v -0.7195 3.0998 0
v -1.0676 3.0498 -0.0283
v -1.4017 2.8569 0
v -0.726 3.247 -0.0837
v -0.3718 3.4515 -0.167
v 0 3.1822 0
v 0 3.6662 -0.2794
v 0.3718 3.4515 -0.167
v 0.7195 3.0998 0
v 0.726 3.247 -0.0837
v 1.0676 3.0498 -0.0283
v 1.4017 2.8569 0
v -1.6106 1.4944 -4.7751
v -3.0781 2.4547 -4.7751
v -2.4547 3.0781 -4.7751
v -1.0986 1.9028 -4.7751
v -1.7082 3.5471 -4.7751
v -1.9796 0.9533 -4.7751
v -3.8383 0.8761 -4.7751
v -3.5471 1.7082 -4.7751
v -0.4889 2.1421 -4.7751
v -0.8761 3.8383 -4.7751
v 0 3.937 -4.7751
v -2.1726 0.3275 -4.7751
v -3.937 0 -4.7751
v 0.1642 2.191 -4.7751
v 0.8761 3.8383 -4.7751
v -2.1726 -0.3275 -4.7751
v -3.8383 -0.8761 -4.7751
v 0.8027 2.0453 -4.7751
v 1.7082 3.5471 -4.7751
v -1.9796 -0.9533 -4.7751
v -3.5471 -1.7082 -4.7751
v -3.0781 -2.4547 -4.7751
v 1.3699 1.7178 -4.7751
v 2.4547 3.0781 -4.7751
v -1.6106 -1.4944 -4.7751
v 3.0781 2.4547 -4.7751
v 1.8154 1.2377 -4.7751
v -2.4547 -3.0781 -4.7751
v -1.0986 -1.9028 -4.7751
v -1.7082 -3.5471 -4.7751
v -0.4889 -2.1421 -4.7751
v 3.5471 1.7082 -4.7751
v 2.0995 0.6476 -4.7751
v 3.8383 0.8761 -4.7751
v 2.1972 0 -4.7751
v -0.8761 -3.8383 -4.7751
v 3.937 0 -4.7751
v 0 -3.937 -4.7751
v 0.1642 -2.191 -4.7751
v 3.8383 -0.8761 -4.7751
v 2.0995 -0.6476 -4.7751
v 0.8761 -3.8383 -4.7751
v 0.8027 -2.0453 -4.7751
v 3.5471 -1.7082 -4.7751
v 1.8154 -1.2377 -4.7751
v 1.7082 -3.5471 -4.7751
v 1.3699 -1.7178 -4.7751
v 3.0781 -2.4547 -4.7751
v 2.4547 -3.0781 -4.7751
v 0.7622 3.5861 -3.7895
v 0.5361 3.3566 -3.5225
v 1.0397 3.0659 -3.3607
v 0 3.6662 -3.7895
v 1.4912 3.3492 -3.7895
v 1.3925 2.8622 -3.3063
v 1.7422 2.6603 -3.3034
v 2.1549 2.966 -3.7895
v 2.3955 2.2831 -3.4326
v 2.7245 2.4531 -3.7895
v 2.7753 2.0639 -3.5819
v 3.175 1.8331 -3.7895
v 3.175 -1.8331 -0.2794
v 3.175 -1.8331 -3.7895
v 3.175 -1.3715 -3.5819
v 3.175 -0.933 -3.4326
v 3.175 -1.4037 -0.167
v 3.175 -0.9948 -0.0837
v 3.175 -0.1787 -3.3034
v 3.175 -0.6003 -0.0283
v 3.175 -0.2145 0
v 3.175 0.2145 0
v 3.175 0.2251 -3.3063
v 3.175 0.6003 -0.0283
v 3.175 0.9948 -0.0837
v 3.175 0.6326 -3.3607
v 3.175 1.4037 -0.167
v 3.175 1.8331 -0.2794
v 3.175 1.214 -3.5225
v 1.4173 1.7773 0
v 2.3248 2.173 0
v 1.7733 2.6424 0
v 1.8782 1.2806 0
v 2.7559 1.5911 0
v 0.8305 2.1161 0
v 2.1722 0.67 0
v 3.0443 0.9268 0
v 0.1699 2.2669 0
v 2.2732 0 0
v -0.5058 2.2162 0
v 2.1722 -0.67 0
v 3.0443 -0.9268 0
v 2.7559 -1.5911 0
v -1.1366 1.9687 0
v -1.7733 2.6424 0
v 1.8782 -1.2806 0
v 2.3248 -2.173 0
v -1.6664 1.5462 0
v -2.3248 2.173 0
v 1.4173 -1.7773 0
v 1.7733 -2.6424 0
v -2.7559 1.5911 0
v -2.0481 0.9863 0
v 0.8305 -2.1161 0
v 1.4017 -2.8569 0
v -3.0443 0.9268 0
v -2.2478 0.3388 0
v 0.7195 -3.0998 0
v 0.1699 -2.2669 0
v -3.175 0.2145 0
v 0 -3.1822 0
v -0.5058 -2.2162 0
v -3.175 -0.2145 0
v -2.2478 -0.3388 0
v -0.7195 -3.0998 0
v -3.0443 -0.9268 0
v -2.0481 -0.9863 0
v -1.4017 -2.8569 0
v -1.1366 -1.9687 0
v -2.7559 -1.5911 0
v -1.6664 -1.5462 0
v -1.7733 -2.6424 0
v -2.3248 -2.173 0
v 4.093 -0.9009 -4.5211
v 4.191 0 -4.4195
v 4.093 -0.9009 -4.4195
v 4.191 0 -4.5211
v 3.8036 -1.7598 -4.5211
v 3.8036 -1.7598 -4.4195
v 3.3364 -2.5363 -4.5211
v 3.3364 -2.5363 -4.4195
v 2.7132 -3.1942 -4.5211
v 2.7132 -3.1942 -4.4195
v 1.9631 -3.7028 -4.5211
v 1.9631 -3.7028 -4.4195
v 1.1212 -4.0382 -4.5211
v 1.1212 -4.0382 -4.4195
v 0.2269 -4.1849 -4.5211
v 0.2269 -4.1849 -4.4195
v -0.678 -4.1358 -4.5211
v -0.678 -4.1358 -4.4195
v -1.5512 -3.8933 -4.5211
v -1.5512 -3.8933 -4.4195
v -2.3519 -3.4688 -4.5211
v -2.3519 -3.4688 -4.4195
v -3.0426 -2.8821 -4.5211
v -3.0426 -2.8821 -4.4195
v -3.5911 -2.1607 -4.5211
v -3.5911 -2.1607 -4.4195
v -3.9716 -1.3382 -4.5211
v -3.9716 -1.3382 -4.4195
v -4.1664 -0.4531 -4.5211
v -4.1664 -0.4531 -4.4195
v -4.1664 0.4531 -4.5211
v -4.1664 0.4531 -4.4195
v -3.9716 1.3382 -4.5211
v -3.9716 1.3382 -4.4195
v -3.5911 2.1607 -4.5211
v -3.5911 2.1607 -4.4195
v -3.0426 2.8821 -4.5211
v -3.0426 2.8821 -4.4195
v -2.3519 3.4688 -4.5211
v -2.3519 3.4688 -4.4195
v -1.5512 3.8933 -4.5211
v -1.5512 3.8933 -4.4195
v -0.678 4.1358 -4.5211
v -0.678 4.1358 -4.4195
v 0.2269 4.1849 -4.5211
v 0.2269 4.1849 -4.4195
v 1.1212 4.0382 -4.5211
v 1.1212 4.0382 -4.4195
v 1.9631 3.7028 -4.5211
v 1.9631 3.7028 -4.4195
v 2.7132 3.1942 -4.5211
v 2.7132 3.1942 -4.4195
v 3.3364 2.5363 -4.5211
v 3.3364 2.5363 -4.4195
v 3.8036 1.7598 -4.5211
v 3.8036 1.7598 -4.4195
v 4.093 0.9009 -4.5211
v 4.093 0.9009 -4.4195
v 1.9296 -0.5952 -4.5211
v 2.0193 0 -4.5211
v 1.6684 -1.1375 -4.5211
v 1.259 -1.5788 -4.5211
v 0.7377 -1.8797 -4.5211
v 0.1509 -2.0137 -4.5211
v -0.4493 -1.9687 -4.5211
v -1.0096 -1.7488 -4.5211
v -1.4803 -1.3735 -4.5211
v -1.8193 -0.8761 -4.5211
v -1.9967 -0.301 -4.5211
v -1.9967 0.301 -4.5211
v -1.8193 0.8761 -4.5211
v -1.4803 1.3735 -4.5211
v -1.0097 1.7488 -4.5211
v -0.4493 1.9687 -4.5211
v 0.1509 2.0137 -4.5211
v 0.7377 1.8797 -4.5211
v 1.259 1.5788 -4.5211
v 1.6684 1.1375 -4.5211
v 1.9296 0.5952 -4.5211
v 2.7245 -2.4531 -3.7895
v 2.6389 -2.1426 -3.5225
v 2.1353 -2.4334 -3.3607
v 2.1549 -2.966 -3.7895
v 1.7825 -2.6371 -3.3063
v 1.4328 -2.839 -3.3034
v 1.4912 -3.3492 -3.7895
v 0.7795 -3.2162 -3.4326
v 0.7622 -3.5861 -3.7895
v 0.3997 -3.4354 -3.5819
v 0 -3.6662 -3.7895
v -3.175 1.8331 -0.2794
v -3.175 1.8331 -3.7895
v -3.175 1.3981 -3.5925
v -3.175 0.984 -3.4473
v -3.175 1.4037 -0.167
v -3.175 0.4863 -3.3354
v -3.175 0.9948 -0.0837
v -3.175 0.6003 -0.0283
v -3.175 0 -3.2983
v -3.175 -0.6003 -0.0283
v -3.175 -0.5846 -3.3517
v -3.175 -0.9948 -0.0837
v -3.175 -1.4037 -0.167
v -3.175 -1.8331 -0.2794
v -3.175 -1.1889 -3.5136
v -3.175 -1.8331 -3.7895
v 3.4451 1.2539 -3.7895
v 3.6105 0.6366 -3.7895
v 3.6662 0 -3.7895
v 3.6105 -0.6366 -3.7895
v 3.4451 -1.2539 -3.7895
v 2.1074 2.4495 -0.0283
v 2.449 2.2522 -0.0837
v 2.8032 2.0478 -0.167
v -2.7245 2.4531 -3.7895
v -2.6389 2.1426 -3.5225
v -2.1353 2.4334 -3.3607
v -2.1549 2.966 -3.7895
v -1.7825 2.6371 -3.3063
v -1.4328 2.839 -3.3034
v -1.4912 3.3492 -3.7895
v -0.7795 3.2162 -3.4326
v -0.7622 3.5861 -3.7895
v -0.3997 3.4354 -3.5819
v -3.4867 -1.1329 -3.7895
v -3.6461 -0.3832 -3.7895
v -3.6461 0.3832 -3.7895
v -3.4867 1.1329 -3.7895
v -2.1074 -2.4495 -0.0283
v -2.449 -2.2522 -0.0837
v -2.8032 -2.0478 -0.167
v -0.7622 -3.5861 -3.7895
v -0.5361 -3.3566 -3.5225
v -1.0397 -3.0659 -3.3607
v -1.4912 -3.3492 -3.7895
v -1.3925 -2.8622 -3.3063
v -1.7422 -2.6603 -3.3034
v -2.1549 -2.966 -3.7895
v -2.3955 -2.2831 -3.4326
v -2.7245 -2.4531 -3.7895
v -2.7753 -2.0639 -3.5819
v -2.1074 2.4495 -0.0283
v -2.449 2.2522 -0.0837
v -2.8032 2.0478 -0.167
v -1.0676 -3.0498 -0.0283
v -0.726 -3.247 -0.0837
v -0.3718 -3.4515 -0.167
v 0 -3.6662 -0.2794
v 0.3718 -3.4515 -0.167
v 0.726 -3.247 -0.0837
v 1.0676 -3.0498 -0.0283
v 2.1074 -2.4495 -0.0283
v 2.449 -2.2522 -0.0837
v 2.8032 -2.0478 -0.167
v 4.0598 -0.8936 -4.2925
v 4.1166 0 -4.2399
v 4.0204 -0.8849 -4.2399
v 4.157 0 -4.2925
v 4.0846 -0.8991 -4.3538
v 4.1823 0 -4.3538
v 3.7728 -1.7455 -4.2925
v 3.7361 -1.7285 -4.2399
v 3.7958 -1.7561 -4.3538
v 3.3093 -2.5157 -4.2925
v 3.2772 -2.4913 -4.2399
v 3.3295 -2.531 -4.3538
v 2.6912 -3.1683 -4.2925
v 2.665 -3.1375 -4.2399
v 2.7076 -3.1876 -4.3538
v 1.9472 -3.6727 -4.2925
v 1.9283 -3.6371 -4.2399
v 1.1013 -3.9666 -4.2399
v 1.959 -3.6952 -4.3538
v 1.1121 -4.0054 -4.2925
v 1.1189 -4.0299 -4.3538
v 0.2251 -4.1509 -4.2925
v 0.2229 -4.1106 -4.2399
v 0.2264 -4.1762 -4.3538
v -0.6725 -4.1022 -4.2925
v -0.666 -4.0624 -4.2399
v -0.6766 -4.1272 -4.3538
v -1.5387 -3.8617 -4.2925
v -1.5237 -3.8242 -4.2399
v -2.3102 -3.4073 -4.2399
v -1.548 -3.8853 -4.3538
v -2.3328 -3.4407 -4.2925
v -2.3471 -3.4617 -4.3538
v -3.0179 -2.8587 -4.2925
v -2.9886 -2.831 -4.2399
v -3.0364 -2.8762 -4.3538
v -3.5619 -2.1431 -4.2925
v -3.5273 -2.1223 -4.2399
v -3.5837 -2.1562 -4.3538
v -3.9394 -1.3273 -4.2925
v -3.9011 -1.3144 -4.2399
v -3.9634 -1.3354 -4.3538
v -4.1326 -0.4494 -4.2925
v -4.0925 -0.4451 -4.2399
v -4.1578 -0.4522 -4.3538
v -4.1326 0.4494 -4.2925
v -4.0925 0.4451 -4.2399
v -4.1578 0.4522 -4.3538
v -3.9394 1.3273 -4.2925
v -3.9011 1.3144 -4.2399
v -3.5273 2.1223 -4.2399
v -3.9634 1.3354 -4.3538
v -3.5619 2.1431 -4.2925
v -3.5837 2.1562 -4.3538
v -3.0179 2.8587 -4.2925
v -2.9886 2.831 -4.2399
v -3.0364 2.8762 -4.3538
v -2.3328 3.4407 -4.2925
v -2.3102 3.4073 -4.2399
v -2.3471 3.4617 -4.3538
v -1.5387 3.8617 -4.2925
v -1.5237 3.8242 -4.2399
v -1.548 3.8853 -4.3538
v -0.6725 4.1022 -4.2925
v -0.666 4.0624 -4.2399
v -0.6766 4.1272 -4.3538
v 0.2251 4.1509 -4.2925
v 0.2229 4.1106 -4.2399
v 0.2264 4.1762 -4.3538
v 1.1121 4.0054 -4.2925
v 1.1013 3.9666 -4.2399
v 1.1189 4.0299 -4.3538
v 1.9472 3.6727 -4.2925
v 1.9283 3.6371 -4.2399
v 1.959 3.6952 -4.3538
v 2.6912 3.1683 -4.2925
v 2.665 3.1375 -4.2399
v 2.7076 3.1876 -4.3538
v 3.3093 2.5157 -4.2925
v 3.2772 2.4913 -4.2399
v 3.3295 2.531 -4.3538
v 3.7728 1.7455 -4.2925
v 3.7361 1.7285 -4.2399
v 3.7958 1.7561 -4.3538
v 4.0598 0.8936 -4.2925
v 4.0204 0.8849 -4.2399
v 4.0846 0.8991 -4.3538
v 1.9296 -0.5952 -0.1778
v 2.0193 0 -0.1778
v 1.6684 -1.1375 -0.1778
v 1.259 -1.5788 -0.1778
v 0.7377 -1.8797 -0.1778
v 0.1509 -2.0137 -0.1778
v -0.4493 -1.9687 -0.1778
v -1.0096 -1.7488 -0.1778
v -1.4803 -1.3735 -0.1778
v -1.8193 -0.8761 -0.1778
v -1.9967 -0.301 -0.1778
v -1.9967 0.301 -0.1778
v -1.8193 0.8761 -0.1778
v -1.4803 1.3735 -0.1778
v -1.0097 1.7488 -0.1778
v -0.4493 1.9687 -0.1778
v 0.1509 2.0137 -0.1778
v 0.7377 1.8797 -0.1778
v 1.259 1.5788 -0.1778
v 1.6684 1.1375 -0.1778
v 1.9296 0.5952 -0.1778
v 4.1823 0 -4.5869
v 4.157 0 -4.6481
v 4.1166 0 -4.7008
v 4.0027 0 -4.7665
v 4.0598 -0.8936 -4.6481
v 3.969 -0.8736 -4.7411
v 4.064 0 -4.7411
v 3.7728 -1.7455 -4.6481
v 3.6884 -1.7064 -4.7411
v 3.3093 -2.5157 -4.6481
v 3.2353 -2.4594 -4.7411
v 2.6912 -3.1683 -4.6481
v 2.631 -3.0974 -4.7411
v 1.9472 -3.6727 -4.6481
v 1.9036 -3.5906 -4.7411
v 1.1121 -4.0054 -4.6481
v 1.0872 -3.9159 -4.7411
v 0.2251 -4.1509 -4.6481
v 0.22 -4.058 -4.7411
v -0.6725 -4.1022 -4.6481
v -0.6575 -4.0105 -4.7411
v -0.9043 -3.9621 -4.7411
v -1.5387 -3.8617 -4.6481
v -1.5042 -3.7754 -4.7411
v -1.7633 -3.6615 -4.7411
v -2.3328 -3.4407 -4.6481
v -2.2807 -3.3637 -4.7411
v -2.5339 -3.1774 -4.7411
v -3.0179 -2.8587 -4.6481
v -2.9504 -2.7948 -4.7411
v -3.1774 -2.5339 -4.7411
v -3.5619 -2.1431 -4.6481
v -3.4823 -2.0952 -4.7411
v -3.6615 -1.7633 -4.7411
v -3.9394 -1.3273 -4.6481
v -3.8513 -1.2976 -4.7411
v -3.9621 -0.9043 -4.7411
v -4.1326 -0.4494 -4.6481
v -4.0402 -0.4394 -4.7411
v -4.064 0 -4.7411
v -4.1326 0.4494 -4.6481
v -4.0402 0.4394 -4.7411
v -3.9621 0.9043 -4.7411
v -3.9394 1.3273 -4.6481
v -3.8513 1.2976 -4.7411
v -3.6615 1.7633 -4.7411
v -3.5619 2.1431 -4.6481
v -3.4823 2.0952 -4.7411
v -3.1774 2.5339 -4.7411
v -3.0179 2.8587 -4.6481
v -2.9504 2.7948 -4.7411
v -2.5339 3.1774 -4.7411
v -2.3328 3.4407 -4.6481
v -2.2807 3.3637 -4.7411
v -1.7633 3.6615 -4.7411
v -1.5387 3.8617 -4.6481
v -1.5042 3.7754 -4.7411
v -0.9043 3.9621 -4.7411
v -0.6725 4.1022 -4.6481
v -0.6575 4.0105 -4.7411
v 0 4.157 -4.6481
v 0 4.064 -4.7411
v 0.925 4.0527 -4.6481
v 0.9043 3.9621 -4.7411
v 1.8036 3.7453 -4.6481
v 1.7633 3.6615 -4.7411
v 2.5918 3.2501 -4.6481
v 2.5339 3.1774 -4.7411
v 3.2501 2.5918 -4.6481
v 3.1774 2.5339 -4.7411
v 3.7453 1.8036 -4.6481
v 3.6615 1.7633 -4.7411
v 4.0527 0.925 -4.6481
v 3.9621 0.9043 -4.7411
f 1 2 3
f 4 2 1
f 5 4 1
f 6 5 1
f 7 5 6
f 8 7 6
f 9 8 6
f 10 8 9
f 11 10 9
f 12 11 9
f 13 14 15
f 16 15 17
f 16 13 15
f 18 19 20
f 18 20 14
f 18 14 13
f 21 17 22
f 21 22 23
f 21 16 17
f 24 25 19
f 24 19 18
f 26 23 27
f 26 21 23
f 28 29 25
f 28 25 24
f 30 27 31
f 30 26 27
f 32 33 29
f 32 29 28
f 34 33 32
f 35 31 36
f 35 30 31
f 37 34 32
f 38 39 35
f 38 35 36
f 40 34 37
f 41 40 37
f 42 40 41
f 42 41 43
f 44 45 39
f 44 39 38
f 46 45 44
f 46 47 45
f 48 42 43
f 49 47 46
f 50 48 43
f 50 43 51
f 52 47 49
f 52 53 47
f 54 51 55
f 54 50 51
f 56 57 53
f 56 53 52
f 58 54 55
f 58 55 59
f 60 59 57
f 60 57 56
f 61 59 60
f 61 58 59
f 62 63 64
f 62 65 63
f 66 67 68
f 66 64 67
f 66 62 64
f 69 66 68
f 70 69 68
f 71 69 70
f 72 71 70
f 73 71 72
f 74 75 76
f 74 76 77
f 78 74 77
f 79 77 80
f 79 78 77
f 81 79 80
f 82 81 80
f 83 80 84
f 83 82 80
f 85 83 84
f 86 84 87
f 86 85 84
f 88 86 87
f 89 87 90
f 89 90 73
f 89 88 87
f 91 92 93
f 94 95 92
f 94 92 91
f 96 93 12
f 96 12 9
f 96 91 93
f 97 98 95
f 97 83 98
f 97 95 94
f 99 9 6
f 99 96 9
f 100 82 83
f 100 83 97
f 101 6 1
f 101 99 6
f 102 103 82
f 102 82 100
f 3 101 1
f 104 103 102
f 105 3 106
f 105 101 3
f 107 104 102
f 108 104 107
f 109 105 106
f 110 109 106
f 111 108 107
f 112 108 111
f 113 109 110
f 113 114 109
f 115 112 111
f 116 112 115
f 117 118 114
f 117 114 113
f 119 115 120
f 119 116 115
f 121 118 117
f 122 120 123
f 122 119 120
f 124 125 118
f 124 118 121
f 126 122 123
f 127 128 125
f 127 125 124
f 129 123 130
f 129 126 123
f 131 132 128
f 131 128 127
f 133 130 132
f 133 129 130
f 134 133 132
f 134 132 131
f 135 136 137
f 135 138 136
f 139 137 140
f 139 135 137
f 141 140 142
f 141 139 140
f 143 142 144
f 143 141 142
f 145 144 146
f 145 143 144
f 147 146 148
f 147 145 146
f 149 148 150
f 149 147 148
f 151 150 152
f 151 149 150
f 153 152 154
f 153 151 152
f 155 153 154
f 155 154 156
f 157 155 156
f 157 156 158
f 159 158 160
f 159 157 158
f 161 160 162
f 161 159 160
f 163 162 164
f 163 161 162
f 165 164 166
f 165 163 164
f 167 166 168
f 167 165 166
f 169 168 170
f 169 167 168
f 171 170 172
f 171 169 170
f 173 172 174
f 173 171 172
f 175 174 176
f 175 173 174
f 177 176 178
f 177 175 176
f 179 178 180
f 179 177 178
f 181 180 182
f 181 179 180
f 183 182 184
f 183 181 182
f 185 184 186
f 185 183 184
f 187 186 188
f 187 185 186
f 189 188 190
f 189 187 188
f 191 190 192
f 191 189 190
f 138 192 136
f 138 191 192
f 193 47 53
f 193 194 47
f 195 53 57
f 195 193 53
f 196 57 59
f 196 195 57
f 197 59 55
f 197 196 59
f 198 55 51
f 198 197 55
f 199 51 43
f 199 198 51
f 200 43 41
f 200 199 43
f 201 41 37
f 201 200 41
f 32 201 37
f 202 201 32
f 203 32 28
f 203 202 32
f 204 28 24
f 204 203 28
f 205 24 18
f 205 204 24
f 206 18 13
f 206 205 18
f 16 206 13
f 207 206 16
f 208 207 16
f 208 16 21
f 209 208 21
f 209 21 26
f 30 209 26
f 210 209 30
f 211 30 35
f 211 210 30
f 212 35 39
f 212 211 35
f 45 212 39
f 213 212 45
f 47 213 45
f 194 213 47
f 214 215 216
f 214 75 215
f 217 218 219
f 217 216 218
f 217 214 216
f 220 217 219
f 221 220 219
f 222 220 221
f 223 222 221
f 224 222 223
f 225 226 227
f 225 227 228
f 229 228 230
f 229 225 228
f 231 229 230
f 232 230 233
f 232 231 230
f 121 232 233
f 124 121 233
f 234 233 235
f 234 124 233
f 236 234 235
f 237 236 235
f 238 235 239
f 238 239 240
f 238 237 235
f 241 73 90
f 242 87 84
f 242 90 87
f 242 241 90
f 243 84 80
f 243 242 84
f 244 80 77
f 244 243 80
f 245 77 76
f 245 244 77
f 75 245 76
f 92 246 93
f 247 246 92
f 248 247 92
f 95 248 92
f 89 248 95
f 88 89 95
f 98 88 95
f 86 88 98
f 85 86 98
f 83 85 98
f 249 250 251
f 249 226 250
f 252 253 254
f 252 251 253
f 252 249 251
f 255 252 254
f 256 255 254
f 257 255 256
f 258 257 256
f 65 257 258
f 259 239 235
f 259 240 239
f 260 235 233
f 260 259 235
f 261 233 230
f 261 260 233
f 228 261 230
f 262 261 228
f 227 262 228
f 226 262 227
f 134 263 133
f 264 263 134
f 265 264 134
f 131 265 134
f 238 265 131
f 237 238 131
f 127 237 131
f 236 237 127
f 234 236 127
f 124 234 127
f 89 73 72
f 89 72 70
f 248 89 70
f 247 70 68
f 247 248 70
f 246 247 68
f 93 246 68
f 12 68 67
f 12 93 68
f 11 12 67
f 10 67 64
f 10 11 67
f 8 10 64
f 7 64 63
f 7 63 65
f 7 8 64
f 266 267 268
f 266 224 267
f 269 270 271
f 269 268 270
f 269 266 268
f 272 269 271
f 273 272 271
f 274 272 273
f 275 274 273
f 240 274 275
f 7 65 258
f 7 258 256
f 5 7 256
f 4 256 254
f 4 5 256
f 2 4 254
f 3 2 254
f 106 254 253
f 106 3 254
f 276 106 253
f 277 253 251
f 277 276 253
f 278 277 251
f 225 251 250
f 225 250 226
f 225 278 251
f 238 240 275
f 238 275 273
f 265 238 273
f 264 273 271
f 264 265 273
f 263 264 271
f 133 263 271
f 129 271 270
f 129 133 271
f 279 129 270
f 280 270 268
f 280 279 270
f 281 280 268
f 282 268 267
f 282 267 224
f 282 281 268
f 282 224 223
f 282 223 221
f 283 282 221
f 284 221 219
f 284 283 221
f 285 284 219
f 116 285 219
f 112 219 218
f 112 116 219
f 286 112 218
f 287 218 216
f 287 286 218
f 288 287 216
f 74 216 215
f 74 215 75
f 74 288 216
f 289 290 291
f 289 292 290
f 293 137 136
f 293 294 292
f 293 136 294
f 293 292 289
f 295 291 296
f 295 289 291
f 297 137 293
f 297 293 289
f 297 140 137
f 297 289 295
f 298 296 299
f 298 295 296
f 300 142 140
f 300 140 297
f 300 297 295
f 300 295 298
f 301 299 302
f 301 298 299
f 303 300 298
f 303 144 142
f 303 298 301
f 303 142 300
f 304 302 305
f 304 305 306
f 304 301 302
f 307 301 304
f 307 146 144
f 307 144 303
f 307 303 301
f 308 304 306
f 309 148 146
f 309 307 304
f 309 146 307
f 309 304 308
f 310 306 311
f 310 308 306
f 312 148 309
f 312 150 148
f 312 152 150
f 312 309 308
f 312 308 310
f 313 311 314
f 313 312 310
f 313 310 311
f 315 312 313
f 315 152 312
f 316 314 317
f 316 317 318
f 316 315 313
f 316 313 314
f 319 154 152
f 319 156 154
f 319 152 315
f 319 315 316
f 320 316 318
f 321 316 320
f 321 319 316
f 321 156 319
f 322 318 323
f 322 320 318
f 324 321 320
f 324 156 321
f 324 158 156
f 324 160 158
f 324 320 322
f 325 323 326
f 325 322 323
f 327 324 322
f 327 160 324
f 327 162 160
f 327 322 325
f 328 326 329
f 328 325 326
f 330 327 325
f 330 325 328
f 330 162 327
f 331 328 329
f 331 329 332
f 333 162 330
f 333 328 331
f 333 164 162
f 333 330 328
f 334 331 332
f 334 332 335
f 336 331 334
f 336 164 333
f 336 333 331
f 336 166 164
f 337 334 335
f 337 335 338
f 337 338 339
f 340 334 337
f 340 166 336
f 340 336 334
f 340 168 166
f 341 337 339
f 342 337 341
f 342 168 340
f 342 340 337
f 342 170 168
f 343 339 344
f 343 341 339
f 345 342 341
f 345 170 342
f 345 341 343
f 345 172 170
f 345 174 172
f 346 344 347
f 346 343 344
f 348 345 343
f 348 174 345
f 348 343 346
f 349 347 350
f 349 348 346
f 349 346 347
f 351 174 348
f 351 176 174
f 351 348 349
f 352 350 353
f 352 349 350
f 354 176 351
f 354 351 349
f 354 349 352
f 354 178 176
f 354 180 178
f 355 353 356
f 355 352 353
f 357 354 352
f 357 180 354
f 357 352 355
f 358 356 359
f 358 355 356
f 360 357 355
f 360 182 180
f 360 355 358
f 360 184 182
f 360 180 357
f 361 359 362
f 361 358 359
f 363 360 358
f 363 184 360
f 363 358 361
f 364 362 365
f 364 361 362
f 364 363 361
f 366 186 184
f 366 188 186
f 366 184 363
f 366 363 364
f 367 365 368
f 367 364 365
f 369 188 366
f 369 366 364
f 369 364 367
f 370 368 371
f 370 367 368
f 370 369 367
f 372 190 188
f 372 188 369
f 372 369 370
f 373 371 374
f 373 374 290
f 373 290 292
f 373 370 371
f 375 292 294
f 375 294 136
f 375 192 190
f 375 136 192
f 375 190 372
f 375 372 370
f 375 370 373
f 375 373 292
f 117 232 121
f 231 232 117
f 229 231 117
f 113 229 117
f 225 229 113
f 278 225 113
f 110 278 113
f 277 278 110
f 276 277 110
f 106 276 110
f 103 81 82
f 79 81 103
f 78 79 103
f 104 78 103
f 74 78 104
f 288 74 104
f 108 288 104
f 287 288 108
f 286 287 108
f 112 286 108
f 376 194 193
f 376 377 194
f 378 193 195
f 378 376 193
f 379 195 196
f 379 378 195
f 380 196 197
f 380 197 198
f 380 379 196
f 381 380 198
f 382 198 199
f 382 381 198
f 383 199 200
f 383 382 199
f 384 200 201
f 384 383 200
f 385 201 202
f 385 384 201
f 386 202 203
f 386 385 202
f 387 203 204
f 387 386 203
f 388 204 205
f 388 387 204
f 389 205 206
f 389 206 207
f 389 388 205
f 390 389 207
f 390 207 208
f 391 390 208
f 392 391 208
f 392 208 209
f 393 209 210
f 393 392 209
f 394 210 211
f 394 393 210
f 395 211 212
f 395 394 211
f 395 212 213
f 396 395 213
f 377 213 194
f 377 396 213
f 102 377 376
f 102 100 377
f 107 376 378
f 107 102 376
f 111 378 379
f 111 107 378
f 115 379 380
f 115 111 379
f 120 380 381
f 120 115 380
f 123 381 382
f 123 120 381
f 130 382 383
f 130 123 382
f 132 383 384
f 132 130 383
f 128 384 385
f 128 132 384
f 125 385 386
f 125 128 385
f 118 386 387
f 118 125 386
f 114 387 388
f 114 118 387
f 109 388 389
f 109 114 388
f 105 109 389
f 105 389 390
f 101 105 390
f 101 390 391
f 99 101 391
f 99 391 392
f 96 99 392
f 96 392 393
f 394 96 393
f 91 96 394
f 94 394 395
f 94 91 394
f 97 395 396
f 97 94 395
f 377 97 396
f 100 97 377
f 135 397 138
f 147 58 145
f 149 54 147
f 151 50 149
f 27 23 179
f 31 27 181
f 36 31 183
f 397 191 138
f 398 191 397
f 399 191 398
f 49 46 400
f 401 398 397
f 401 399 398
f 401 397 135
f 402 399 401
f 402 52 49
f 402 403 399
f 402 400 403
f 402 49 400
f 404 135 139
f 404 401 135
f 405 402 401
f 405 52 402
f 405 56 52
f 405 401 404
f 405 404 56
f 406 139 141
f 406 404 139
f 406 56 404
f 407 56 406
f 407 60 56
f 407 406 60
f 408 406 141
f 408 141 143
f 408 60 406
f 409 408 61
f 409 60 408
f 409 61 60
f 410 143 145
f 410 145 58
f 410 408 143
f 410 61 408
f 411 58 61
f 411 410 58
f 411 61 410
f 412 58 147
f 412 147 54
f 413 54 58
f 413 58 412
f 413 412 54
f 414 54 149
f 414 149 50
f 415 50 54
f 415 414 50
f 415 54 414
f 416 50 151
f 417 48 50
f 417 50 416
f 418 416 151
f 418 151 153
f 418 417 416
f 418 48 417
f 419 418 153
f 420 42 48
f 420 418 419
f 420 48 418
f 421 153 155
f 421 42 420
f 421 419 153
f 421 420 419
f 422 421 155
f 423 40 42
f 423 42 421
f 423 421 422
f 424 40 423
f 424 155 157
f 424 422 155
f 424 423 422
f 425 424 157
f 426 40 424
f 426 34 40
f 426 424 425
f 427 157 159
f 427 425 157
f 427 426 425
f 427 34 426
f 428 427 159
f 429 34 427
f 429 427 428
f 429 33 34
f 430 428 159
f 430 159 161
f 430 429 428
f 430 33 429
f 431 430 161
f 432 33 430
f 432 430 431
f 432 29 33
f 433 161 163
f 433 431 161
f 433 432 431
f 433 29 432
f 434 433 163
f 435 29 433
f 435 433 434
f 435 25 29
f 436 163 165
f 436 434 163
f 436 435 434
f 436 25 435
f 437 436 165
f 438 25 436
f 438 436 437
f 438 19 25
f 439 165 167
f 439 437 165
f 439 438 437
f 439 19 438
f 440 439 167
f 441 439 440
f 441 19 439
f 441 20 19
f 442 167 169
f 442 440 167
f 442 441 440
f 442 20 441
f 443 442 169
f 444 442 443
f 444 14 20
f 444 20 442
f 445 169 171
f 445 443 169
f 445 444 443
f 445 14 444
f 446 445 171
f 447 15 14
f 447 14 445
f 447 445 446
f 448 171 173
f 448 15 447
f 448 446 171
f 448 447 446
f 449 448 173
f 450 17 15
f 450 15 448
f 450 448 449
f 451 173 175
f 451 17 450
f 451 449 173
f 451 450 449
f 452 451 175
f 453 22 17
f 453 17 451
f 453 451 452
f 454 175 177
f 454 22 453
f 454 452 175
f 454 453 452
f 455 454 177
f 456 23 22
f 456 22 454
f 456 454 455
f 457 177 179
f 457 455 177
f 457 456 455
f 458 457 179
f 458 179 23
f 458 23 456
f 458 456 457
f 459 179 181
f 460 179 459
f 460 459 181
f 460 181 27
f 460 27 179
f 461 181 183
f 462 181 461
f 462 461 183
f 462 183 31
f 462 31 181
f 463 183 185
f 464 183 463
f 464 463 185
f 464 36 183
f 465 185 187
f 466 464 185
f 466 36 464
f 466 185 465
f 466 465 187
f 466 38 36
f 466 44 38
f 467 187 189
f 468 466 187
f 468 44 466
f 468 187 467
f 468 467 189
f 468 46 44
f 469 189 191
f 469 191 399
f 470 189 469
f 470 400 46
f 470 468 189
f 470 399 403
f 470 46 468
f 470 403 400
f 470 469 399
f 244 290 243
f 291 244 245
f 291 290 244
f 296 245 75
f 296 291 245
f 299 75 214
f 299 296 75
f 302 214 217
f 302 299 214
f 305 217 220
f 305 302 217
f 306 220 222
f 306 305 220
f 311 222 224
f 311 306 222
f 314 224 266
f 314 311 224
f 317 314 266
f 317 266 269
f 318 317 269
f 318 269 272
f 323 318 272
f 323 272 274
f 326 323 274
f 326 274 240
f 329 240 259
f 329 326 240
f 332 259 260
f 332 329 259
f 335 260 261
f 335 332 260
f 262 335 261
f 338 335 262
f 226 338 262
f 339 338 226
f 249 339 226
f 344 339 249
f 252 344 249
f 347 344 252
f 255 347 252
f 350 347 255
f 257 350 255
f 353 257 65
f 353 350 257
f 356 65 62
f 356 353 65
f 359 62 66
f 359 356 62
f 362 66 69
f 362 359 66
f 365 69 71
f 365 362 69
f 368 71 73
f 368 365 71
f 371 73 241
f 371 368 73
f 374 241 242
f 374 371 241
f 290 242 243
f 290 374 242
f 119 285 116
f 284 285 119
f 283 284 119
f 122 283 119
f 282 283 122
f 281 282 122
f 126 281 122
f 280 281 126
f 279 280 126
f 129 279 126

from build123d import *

# Parameters (mm, degrees)
C_EXT_HEX_REACH = 9.611
SKETCH2_R       = 3.793174209


with BuildPart() as part:
    # Sketch1 → Revolve1 (revolve)
    with BuildSketch(Plane(origin=(0, 0, 0), x_dir=(0, -1, 0), z_dir=(1, 0, 0)), mode=Mode.PRIVATE) as revolve1_sk:
        with BuildLine():
            Line((2.273224716, 0), (3.182239192, 0))
            Line((3.182239192, 0), (3.666174188, 0.2794))
            Line((3.666174188, 0.2794), (3.666174188, 3.789511232))
            Line((3.666174188, 3.789511232), (4.116605118, 4.239942163))
            ThreePointArc((4.116605118, 4.239942163), (4.171665397, 4.322345693), (4.190999996, 4.419547285))
            Line((4.190999996, 4.419547285), (4.190999996, 4.521147285))
            ThreePointArc((4.190999996, 4.521147285), (4.116605118, 4.700752408), (3.936999996, 4.775147285))
            Line((3.936999996, 4.775147285), (2.197152715, 4.775147285))
            Line((2.197152715, 4.775147285), (2.0193, 4.521147285))
            Line((2.0193, 4.521147285), (2.0193, 0.1778))
            Line((2.0193, 0.1778), (2.273224716, 0))
        make_face()
    revolve(revolve1_sk.sketch.rotate(Axis((0, 0, 0), (0, 0, -1)), 270), axis=Axis((0, 0, 0), (0, 0, -1)))

    # C-Ext Hex: up to this cone (the profile starts outside it)
    c_ext_hex_end = Plane(origin=(0, 0, 0), z_dir=(0, 0, -1)).offset(0.123338045) * Cone(1e-06, 9.987662955, 9.987661955, align=(Align.CENTER, Align.CENTER, Align.MIN), mode=Mode.PRIVATE)
    # Sketch2 → C-Ext Hex (cut, up to the surface)
    with BuildSketch(Plane.XY, mode=Mode.PRIVATE) as c_ext_hex_sk1:
        Circle(SKETCH2_R)
        Polygon((0, 3.666174209), (-3.175, 1.833087105), (-3.175, -1.833087105), (0, -3.666174209), (3.175, -1.833087105), (3.175, 1.833087105), align=None, mode=Mode.SUBTRACT)
    c_ext_hex_tool1 = extrude(c_ext_hex_sk1.sketch, amount=-C_EXT_HEX_REACH, mode=Mode.PRIVATE) - c_ext_hex_end
    add(c_ext_hex_tool1.solids().sort_by_distance((-3.685887, 0, 0))[0], mode=Mode.SUBTRACT)


solid = part.part
